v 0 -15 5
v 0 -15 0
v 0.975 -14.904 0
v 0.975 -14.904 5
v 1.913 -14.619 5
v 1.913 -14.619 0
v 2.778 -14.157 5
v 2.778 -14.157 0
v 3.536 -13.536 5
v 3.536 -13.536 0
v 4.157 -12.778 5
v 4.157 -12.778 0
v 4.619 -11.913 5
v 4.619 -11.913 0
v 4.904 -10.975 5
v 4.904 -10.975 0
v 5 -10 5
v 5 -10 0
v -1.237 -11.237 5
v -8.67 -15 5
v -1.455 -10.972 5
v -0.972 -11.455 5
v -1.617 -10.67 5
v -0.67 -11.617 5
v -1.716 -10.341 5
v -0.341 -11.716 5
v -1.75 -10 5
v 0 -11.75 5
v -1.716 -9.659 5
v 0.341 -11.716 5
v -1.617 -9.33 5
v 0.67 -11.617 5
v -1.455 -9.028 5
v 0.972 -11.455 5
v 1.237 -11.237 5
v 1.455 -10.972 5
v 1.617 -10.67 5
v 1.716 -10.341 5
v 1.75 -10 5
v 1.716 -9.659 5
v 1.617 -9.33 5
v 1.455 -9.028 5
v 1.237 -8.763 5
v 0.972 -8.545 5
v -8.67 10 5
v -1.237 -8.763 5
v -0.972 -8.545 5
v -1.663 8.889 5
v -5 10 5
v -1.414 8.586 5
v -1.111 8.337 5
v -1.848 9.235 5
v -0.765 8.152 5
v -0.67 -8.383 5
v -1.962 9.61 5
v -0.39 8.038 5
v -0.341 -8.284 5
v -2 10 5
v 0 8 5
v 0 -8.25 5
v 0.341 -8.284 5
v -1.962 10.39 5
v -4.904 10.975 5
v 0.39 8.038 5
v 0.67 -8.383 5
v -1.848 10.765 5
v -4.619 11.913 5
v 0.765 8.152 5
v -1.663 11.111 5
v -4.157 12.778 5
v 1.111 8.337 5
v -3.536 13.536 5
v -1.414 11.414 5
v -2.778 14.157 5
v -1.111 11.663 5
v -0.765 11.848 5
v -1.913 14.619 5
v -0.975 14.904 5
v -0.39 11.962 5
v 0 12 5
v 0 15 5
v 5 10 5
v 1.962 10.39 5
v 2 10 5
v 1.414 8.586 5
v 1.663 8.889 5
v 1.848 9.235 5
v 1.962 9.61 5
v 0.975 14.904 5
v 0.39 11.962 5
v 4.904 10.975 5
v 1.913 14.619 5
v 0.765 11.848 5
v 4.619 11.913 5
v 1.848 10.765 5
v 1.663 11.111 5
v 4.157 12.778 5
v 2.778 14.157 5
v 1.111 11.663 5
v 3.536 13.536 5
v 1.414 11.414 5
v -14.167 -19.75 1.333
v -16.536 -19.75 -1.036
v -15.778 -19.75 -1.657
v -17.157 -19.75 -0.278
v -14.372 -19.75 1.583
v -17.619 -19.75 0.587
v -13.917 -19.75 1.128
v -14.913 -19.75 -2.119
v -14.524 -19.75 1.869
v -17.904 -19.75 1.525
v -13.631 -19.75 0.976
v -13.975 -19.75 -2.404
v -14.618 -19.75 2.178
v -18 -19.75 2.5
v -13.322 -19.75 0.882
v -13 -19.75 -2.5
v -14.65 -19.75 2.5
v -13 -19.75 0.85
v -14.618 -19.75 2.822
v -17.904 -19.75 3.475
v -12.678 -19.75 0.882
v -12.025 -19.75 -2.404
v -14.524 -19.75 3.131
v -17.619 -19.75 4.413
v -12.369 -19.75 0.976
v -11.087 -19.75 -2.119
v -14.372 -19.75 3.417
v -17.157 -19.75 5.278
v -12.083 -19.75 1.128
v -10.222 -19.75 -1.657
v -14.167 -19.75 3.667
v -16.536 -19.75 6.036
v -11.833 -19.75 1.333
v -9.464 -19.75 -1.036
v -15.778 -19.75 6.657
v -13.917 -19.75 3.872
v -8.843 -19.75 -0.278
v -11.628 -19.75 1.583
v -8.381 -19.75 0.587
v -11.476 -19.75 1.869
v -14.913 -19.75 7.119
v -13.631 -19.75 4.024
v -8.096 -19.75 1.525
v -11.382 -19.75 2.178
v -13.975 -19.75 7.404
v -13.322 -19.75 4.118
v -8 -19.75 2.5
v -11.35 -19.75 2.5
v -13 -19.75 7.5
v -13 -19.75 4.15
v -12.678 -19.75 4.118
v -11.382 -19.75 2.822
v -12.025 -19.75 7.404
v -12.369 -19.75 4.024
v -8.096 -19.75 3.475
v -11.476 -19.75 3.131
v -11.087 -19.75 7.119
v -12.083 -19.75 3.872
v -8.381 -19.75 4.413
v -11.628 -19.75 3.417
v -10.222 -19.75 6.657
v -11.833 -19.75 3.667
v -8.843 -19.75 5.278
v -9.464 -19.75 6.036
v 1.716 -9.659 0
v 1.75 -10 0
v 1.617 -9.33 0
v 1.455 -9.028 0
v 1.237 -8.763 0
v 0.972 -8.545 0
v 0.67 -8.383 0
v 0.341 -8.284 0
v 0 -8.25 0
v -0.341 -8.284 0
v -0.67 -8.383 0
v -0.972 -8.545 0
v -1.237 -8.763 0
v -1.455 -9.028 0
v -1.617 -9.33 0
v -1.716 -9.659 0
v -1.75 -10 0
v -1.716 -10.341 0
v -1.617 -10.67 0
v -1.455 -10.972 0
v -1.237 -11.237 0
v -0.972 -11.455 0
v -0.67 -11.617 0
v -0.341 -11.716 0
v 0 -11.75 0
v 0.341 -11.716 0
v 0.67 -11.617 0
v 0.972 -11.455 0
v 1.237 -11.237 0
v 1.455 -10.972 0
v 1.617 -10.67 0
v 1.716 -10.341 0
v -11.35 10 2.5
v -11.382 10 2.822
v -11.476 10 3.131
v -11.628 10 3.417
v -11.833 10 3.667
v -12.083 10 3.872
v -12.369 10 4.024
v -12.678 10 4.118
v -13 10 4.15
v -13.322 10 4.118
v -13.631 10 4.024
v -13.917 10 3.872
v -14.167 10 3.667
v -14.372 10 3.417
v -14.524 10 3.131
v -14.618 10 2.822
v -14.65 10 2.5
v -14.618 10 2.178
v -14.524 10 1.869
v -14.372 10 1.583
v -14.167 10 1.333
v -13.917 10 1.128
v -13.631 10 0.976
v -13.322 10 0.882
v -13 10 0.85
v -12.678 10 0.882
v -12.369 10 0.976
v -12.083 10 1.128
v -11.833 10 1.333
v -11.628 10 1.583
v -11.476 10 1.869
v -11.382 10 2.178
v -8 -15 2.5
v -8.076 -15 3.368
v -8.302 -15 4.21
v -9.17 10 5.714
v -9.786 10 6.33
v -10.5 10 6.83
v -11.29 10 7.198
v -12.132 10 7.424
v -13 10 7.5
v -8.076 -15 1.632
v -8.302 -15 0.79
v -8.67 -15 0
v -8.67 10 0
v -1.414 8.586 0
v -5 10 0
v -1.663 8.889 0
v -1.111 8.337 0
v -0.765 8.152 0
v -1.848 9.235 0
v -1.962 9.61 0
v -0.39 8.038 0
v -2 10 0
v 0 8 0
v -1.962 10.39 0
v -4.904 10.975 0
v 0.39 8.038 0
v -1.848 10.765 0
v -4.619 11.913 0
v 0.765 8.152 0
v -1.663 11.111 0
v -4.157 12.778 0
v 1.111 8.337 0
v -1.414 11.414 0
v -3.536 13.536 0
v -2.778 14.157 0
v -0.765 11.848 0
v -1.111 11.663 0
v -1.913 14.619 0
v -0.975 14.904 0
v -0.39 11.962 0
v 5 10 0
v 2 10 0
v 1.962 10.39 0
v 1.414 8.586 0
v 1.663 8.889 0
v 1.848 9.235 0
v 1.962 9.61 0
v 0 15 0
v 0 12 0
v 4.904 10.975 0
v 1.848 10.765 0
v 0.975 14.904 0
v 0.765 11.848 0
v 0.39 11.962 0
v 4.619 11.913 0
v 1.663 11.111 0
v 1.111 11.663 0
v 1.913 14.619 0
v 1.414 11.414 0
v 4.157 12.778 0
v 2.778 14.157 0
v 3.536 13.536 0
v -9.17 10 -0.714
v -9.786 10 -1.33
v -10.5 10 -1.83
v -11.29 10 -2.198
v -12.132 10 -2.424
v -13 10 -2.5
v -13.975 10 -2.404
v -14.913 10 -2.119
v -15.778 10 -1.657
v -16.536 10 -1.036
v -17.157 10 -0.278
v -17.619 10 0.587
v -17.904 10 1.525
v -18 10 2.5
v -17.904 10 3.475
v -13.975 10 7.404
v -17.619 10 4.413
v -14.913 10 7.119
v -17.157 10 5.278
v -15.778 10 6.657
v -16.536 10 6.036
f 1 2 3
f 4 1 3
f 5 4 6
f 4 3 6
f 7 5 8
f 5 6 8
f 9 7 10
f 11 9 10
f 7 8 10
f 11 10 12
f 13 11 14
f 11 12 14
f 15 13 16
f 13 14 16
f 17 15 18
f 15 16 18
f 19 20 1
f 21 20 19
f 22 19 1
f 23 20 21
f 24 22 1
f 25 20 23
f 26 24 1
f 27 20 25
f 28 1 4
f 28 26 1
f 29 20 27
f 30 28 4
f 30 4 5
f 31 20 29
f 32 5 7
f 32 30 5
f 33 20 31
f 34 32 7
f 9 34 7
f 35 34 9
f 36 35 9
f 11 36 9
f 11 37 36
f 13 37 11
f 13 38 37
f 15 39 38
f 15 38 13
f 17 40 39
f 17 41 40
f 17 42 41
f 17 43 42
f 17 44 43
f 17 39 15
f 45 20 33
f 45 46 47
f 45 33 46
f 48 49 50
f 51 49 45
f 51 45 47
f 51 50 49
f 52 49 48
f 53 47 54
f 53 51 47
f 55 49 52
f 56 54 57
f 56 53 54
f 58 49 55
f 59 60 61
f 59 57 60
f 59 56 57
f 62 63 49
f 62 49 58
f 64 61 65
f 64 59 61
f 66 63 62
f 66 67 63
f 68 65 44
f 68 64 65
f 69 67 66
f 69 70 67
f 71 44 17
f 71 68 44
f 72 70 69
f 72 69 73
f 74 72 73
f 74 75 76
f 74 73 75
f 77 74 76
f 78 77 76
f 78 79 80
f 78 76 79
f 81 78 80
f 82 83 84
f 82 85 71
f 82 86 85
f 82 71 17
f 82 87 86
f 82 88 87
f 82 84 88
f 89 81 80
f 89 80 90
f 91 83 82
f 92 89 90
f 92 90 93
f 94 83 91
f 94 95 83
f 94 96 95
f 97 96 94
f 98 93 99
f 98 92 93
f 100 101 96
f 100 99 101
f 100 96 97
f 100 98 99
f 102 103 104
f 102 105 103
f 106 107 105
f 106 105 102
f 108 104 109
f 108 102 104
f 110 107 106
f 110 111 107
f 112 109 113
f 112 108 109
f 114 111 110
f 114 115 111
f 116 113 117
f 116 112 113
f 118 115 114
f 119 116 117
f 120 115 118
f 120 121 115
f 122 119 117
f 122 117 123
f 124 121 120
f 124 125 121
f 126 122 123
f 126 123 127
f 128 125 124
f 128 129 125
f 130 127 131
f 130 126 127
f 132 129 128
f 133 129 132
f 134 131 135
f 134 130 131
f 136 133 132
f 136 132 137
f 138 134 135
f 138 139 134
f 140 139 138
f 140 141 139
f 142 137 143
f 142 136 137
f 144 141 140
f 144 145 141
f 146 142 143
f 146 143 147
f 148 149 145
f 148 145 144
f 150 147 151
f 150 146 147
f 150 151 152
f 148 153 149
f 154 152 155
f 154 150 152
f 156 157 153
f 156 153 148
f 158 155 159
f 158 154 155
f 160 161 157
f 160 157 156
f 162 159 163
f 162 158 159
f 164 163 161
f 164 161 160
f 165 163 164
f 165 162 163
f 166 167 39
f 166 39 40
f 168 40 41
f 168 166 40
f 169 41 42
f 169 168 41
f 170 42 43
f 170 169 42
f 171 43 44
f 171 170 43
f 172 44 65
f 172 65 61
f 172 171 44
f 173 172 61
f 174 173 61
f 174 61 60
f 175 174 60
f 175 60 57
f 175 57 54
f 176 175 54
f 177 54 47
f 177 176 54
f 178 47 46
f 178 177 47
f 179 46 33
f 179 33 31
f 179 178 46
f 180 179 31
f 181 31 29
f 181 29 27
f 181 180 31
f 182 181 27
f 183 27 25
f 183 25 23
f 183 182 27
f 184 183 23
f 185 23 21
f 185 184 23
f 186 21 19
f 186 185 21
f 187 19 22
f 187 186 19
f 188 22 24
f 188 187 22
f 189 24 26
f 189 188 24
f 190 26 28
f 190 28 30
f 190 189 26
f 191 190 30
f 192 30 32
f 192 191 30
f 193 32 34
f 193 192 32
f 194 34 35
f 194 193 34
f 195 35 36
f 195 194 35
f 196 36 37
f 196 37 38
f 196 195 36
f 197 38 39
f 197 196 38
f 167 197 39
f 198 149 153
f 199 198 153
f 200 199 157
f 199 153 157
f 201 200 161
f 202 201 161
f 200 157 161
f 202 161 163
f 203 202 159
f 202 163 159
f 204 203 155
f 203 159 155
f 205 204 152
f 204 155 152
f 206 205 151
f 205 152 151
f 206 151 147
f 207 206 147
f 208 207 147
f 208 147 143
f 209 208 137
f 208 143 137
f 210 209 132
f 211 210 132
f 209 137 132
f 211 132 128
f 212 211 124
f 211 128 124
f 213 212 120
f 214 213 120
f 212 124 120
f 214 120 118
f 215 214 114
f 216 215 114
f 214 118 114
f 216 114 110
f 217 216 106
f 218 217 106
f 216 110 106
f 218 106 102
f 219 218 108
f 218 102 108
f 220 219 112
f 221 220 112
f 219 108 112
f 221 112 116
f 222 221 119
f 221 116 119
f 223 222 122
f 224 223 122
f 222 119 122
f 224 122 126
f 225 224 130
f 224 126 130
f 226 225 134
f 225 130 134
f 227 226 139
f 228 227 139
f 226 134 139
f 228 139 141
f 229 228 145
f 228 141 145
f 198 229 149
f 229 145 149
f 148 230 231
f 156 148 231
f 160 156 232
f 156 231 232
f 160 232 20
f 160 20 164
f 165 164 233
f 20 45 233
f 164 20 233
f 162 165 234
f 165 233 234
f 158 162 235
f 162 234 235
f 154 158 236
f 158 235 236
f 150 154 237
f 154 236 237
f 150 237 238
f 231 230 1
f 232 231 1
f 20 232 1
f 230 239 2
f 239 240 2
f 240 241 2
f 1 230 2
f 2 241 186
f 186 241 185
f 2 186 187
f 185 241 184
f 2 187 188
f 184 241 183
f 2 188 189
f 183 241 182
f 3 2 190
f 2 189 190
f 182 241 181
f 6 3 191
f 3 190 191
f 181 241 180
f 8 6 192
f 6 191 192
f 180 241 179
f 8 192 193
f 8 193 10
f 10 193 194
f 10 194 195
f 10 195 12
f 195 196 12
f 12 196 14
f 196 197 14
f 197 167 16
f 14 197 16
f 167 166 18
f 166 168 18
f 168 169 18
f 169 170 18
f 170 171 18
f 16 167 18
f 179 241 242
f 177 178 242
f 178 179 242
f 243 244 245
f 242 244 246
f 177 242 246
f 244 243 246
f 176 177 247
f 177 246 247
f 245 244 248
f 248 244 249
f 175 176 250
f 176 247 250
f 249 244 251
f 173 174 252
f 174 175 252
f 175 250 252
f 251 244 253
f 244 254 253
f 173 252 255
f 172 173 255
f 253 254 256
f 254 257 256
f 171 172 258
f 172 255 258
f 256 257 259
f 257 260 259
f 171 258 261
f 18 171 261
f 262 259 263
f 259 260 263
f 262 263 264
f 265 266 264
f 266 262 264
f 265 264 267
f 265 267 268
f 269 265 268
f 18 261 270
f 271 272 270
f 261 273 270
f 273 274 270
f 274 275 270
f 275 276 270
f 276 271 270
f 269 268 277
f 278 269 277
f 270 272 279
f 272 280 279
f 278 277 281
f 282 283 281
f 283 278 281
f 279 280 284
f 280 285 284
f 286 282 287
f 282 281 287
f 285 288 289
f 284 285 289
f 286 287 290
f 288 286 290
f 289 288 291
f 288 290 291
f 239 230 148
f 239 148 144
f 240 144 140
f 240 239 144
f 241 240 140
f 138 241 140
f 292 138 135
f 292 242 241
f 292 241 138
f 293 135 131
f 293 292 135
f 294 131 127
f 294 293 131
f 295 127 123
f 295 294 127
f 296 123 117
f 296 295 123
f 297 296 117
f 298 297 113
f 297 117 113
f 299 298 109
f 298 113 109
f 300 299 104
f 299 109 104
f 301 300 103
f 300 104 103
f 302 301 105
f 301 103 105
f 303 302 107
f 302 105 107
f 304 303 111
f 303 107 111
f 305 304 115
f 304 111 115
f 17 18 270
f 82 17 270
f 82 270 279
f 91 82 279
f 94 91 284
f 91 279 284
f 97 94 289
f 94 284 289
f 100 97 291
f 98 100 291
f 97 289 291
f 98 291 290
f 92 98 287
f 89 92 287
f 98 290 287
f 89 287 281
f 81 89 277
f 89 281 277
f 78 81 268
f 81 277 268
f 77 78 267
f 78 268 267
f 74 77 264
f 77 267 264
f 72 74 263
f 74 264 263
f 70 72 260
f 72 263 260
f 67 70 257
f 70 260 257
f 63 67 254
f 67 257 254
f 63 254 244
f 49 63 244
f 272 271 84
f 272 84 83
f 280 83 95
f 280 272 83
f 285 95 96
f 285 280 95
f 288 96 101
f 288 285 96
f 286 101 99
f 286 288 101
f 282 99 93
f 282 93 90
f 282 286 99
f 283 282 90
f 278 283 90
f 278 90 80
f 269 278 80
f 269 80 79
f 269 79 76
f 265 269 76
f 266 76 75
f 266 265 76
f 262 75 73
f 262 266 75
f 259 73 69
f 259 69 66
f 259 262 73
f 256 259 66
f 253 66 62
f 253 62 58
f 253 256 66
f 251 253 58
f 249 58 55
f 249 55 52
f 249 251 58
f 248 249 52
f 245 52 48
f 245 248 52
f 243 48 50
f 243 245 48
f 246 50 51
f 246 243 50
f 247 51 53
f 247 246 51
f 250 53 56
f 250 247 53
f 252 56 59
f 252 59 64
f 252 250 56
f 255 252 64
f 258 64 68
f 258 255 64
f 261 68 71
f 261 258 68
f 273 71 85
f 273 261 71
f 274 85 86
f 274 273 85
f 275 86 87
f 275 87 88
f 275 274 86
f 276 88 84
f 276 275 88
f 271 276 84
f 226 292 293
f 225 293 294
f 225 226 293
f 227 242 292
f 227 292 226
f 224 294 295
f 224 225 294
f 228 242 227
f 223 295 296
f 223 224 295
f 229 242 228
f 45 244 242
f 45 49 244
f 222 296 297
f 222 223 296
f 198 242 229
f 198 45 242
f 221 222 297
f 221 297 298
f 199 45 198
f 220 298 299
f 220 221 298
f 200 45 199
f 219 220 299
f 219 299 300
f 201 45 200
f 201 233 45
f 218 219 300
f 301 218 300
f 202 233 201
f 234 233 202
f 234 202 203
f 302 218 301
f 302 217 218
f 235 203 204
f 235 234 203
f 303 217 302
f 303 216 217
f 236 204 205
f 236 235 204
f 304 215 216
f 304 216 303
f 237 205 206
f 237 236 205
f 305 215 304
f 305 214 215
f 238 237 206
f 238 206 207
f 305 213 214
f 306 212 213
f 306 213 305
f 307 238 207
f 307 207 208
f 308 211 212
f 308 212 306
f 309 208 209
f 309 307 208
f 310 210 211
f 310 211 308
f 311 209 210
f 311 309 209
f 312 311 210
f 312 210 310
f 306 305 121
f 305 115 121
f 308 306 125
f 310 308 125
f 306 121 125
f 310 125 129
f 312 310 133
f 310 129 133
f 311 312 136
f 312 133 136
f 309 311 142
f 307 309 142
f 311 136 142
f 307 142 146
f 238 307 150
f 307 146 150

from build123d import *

# Parameters (mm, degrees)
F0_R     = 1.75
F0_R_2   = 2
F1_DEPTH = 5
F2_DEPTH = 7.5
F3_DEPTH = 2.5
F4_R     = 1.65
F5_DEPTH = 29.75
F6_R     = 4.99999


# Not quite as in the source:
# - a fillet or chamfer is up to 0.001 mm smaller than in the source, because OpenCascade refuses the exact size


with BuildPart() as f1:
    # F0 (on Top) → F1 (new body)
    with BuildSketch(Plane.XY):
        with BuildLine():
            Line((-5, 10), (-8, 10))
            Line((-8, 10), (-8, -15))
            Line((-8, -15), (0, -15))
            ThreePointArc((0, -15), (3.5355339059, -13.5355339059), (5, -10))
            Line((5, -10), (5, 10))
            ThreePointArc((5, 10), (0, 15), (-5, 10))
        make_face()
        with Locations((0, -10)):
            Circle(F0_R, mode=Mode.SUBTRACT)
        with Locations((0, 10)):
            Circle(F0_R_2, mode=Mode.SUBTRACT)
    extrude(amount=F1_DEPTH)

    # F0 (on Top) → F2 (join)
    with BuildSketch(Plane.XY):
        Polygon((-8, 10), (-18, 10), (-18, -19.75), (-8, -19.75), (-8, -15), align=None)
    extrude(amount=F2_DEPTH)

    # F0 (on Top) → F3 (join)
    with BuildSketch(Plane.XY):
        Polygon((-8, 10), (-18, 10), (-18, -19.75), (-8, -19.75), (-8, -15), align=None)
    extrude(amount=-F3_DEPTH)

    # F4 (on face) → F5 (cut, through all)
    with BuildSketch(Plane.XZ.offset(19.75)):
        with Locations((-13, 2.5)):
            Circle(F4_R)
    extrude(amount=-F5_DEPTH, mode=Mode.SUBTRACT)

    # F6 (radius 5 in the source; OpenCascade refuses exactly that, so slightly less here)
    f6_edges = [f1.edges().sort_by_distance(p)[0] for p in [
        (-18, -4.875, 7.5),
        (-18, -4.875, -2.5),
        (-8, -4.875, 7.5),
        (-8, -4.875, -2.5),
    ]]
    fillet(f6_edges, radius=F6_R)


solid = f1.part
